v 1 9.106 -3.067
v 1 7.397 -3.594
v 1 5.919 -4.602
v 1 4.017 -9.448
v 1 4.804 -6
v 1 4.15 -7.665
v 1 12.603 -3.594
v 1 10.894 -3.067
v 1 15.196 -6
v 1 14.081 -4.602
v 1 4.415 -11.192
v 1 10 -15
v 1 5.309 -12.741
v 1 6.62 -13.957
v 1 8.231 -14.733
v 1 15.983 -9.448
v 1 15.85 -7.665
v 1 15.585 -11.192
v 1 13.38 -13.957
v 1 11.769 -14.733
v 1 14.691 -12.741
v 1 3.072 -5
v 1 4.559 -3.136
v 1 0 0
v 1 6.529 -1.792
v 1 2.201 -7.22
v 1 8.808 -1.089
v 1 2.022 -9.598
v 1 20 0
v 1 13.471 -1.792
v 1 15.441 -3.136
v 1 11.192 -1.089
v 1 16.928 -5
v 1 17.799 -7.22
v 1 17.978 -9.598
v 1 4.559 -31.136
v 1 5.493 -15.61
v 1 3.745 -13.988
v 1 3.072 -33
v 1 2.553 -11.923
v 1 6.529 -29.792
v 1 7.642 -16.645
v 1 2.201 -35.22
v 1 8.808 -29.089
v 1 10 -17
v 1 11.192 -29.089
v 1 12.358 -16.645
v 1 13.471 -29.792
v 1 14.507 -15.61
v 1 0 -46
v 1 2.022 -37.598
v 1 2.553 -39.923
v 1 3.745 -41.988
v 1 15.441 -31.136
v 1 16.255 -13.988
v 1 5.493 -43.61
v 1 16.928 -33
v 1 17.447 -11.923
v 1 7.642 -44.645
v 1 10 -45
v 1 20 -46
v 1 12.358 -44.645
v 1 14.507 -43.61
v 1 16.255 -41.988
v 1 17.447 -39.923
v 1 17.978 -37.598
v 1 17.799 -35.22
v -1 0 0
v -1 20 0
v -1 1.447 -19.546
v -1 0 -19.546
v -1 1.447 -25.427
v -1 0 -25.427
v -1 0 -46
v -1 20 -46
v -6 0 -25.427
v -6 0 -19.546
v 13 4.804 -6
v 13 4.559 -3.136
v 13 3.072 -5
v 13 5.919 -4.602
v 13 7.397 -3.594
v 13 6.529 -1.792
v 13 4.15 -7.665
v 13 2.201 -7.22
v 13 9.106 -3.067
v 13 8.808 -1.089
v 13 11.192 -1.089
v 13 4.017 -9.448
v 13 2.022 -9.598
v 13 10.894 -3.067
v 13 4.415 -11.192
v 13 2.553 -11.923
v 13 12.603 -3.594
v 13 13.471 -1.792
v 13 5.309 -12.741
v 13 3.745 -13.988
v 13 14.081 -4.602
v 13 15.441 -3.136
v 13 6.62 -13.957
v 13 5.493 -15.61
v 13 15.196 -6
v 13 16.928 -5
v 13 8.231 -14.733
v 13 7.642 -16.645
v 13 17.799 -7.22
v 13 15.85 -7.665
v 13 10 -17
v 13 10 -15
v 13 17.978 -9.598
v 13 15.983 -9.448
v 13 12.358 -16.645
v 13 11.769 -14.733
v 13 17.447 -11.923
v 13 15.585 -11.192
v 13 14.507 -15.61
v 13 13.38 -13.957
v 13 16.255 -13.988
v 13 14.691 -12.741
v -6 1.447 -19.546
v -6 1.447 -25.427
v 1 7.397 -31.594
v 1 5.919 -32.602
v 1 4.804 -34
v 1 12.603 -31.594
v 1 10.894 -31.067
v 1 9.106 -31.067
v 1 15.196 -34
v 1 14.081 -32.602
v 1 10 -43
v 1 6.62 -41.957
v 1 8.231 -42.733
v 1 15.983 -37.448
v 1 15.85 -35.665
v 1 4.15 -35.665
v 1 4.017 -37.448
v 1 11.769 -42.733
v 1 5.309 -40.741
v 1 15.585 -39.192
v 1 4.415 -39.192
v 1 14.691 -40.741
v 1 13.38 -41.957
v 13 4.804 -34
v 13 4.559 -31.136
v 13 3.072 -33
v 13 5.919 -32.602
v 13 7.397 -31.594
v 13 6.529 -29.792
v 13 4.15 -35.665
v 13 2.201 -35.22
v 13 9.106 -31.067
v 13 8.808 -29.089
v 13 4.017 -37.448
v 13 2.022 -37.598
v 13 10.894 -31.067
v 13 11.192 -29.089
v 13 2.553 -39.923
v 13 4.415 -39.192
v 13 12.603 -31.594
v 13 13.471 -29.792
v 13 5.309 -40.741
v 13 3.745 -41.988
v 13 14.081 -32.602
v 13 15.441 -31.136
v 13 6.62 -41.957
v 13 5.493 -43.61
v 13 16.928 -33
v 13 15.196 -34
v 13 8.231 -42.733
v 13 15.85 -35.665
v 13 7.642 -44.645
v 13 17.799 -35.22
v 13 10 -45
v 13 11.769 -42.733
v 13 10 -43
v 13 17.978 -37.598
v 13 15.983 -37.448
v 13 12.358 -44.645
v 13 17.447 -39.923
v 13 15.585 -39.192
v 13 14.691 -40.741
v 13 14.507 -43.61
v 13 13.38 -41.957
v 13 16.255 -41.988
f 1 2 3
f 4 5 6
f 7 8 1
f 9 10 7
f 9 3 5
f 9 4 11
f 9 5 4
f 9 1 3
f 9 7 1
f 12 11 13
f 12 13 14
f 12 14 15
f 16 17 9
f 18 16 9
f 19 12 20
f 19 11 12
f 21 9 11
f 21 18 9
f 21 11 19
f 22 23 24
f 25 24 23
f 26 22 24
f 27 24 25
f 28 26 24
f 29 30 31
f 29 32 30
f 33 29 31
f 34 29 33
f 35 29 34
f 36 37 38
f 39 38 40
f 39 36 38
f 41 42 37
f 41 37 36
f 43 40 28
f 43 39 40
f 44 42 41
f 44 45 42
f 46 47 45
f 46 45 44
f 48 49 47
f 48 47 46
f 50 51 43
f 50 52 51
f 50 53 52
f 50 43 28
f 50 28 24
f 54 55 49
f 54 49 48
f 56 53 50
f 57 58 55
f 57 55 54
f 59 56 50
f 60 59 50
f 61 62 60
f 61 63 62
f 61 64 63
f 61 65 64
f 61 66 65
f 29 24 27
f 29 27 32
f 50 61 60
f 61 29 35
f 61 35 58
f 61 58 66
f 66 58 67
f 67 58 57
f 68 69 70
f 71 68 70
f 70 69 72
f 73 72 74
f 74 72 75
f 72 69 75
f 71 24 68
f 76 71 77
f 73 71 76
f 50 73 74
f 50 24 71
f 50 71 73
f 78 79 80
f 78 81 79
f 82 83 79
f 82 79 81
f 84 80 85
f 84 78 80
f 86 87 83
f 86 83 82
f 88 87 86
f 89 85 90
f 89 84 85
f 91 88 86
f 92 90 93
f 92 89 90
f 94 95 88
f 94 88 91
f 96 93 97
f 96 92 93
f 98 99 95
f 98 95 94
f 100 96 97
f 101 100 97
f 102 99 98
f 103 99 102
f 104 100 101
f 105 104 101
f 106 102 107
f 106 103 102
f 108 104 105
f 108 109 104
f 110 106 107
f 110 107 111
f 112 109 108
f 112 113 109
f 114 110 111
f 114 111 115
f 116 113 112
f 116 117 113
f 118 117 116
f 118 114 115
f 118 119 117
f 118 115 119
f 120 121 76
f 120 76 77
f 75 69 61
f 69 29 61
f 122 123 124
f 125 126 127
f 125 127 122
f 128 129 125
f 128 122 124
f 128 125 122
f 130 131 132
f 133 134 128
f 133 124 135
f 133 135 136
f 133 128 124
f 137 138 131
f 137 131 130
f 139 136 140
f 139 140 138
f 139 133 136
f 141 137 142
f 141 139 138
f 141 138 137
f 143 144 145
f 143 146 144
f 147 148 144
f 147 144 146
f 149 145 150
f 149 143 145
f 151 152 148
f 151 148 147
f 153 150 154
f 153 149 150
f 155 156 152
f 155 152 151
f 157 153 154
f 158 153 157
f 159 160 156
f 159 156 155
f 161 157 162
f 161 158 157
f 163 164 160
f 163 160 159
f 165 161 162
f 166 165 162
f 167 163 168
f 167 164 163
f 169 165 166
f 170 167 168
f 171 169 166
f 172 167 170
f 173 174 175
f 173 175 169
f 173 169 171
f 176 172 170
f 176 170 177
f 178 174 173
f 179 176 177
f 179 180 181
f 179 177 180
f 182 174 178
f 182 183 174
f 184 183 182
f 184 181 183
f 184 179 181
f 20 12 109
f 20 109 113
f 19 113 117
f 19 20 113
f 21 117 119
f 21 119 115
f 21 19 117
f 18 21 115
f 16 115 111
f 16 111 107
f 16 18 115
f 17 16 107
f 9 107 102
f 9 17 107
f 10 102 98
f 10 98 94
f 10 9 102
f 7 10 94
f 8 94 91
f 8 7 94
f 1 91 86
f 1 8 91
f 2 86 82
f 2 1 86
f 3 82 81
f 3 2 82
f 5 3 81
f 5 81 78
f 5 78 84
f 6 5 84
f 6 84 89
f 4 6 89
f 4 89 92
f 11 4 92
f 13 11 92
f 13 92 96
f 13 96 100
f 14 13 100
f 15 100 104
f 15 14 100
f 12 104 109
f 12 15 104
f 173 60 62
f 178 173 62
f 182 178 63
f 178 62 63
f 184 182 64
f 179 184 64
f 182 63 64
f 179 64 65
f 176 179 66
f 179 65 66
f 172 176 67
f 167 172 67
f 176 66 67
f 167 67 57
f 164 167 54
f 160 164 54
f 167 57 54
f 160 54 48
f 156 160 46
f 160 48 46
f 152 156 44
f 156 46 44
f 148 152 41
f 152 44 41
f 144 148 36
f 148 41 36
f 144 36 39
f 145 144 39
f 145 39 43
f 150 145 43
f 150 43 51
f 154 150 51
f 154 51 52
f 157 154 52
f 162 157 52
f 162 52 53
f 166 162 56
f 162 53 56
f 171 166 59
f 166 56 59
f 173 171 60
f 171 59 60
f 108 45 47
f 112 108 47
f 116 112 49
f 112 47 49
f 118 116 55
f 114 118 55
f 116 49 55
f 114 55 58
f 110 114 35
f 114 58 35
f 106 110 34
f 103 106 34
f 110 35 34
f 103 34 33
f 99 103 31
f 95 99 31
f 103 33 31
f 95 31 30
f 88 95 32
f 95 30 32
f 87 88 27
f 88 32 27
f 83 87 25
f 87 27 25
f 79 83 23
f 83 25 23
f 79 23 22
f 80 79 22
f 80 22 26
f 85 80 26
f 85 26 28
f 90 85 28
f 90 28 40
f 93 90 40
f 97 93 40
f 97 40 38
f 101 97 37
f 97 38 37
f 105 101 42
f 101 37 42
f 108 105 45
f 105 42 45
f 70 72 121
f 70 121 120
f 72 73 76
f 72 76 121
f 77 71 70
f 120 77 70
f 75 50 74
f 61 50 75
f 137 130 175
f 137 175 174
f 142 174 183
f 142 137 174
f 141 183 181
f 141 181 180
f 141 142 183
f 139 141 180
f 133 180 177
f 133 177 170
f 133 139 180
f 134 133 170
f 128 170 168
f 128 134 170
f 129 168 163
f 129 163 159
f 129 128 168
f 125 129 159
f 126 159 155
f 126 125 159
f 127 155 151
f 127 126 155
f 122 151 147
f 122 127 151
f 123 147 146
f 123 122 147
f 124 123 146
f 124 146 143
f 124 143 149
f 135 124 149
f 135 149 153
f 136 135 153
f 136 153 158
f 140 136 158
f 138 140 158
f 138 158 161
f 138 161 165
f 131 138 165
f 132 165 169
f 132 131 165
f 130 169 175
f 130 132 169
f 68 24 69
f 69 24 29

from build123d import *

# Parameters (mm, degrees)
SKETCH1_W           = 46
SKETCH1_H           = 20
BOSS_EXTRUDE1_DEPTH = 1
SKETCH2_R           = 8
SKETCH2_R_2         = 6
BOSS_EXTRUDE2_DEPTH = 12
SKETCH3_W           = 5.881600094
SKETCH3_H           = 1.447060341
BOSS_EXTRUDE3_DEPTH = 5


with BuildPart() as part:
    # Sketch1 → Boss-Extrude1 (new body, symmetric)
    with BuildSketch(Plane(origin=(0, 0, 0), x_dir=(0, 0, -1), z_dir=(1, 0, 0))):
        with Locations((23, 10)):
            Rectangle(SKETCH1_W, SKETCH1_H)
    extrude(amount=BOSS_EXTRUDE1_DEPTH, both=True)

    # Sketch2 → Boss-Extrude2 (add)
    with BuildSketch(Plane(origin=(1, 0, 0), x_dir=(0, 0, -1), z_dir=(1, 0, 0))):
        with Locations((9, 10)):
            Circle(SKETCH2_R)
        with Locations((9, 10)):
            Circle(SKETCH2_R_2, mode=Mode.SUBTRACT)
        with Locations((37, 10)):
            Circle(SKETCH2_R)
        with Locations((37, 10)):
            Circle(SKETCH2_R_2, mode=Mode.SUBTRACT)
    extrude(amount=BOSS_EXTRUDE2_DEPTH)

    # Sketch3 → Boss-Extrude3 (add)
    with BuildSketch(Plane.ZY.offset(1)):
        with Locations((-22.486526976, 0.723530171)):
            Rectangle(SKETCH3_W, SKETCH3_H)
    extrude(amount=BOSS_EXTRUDE3_DEPTH)


solid = part.part
